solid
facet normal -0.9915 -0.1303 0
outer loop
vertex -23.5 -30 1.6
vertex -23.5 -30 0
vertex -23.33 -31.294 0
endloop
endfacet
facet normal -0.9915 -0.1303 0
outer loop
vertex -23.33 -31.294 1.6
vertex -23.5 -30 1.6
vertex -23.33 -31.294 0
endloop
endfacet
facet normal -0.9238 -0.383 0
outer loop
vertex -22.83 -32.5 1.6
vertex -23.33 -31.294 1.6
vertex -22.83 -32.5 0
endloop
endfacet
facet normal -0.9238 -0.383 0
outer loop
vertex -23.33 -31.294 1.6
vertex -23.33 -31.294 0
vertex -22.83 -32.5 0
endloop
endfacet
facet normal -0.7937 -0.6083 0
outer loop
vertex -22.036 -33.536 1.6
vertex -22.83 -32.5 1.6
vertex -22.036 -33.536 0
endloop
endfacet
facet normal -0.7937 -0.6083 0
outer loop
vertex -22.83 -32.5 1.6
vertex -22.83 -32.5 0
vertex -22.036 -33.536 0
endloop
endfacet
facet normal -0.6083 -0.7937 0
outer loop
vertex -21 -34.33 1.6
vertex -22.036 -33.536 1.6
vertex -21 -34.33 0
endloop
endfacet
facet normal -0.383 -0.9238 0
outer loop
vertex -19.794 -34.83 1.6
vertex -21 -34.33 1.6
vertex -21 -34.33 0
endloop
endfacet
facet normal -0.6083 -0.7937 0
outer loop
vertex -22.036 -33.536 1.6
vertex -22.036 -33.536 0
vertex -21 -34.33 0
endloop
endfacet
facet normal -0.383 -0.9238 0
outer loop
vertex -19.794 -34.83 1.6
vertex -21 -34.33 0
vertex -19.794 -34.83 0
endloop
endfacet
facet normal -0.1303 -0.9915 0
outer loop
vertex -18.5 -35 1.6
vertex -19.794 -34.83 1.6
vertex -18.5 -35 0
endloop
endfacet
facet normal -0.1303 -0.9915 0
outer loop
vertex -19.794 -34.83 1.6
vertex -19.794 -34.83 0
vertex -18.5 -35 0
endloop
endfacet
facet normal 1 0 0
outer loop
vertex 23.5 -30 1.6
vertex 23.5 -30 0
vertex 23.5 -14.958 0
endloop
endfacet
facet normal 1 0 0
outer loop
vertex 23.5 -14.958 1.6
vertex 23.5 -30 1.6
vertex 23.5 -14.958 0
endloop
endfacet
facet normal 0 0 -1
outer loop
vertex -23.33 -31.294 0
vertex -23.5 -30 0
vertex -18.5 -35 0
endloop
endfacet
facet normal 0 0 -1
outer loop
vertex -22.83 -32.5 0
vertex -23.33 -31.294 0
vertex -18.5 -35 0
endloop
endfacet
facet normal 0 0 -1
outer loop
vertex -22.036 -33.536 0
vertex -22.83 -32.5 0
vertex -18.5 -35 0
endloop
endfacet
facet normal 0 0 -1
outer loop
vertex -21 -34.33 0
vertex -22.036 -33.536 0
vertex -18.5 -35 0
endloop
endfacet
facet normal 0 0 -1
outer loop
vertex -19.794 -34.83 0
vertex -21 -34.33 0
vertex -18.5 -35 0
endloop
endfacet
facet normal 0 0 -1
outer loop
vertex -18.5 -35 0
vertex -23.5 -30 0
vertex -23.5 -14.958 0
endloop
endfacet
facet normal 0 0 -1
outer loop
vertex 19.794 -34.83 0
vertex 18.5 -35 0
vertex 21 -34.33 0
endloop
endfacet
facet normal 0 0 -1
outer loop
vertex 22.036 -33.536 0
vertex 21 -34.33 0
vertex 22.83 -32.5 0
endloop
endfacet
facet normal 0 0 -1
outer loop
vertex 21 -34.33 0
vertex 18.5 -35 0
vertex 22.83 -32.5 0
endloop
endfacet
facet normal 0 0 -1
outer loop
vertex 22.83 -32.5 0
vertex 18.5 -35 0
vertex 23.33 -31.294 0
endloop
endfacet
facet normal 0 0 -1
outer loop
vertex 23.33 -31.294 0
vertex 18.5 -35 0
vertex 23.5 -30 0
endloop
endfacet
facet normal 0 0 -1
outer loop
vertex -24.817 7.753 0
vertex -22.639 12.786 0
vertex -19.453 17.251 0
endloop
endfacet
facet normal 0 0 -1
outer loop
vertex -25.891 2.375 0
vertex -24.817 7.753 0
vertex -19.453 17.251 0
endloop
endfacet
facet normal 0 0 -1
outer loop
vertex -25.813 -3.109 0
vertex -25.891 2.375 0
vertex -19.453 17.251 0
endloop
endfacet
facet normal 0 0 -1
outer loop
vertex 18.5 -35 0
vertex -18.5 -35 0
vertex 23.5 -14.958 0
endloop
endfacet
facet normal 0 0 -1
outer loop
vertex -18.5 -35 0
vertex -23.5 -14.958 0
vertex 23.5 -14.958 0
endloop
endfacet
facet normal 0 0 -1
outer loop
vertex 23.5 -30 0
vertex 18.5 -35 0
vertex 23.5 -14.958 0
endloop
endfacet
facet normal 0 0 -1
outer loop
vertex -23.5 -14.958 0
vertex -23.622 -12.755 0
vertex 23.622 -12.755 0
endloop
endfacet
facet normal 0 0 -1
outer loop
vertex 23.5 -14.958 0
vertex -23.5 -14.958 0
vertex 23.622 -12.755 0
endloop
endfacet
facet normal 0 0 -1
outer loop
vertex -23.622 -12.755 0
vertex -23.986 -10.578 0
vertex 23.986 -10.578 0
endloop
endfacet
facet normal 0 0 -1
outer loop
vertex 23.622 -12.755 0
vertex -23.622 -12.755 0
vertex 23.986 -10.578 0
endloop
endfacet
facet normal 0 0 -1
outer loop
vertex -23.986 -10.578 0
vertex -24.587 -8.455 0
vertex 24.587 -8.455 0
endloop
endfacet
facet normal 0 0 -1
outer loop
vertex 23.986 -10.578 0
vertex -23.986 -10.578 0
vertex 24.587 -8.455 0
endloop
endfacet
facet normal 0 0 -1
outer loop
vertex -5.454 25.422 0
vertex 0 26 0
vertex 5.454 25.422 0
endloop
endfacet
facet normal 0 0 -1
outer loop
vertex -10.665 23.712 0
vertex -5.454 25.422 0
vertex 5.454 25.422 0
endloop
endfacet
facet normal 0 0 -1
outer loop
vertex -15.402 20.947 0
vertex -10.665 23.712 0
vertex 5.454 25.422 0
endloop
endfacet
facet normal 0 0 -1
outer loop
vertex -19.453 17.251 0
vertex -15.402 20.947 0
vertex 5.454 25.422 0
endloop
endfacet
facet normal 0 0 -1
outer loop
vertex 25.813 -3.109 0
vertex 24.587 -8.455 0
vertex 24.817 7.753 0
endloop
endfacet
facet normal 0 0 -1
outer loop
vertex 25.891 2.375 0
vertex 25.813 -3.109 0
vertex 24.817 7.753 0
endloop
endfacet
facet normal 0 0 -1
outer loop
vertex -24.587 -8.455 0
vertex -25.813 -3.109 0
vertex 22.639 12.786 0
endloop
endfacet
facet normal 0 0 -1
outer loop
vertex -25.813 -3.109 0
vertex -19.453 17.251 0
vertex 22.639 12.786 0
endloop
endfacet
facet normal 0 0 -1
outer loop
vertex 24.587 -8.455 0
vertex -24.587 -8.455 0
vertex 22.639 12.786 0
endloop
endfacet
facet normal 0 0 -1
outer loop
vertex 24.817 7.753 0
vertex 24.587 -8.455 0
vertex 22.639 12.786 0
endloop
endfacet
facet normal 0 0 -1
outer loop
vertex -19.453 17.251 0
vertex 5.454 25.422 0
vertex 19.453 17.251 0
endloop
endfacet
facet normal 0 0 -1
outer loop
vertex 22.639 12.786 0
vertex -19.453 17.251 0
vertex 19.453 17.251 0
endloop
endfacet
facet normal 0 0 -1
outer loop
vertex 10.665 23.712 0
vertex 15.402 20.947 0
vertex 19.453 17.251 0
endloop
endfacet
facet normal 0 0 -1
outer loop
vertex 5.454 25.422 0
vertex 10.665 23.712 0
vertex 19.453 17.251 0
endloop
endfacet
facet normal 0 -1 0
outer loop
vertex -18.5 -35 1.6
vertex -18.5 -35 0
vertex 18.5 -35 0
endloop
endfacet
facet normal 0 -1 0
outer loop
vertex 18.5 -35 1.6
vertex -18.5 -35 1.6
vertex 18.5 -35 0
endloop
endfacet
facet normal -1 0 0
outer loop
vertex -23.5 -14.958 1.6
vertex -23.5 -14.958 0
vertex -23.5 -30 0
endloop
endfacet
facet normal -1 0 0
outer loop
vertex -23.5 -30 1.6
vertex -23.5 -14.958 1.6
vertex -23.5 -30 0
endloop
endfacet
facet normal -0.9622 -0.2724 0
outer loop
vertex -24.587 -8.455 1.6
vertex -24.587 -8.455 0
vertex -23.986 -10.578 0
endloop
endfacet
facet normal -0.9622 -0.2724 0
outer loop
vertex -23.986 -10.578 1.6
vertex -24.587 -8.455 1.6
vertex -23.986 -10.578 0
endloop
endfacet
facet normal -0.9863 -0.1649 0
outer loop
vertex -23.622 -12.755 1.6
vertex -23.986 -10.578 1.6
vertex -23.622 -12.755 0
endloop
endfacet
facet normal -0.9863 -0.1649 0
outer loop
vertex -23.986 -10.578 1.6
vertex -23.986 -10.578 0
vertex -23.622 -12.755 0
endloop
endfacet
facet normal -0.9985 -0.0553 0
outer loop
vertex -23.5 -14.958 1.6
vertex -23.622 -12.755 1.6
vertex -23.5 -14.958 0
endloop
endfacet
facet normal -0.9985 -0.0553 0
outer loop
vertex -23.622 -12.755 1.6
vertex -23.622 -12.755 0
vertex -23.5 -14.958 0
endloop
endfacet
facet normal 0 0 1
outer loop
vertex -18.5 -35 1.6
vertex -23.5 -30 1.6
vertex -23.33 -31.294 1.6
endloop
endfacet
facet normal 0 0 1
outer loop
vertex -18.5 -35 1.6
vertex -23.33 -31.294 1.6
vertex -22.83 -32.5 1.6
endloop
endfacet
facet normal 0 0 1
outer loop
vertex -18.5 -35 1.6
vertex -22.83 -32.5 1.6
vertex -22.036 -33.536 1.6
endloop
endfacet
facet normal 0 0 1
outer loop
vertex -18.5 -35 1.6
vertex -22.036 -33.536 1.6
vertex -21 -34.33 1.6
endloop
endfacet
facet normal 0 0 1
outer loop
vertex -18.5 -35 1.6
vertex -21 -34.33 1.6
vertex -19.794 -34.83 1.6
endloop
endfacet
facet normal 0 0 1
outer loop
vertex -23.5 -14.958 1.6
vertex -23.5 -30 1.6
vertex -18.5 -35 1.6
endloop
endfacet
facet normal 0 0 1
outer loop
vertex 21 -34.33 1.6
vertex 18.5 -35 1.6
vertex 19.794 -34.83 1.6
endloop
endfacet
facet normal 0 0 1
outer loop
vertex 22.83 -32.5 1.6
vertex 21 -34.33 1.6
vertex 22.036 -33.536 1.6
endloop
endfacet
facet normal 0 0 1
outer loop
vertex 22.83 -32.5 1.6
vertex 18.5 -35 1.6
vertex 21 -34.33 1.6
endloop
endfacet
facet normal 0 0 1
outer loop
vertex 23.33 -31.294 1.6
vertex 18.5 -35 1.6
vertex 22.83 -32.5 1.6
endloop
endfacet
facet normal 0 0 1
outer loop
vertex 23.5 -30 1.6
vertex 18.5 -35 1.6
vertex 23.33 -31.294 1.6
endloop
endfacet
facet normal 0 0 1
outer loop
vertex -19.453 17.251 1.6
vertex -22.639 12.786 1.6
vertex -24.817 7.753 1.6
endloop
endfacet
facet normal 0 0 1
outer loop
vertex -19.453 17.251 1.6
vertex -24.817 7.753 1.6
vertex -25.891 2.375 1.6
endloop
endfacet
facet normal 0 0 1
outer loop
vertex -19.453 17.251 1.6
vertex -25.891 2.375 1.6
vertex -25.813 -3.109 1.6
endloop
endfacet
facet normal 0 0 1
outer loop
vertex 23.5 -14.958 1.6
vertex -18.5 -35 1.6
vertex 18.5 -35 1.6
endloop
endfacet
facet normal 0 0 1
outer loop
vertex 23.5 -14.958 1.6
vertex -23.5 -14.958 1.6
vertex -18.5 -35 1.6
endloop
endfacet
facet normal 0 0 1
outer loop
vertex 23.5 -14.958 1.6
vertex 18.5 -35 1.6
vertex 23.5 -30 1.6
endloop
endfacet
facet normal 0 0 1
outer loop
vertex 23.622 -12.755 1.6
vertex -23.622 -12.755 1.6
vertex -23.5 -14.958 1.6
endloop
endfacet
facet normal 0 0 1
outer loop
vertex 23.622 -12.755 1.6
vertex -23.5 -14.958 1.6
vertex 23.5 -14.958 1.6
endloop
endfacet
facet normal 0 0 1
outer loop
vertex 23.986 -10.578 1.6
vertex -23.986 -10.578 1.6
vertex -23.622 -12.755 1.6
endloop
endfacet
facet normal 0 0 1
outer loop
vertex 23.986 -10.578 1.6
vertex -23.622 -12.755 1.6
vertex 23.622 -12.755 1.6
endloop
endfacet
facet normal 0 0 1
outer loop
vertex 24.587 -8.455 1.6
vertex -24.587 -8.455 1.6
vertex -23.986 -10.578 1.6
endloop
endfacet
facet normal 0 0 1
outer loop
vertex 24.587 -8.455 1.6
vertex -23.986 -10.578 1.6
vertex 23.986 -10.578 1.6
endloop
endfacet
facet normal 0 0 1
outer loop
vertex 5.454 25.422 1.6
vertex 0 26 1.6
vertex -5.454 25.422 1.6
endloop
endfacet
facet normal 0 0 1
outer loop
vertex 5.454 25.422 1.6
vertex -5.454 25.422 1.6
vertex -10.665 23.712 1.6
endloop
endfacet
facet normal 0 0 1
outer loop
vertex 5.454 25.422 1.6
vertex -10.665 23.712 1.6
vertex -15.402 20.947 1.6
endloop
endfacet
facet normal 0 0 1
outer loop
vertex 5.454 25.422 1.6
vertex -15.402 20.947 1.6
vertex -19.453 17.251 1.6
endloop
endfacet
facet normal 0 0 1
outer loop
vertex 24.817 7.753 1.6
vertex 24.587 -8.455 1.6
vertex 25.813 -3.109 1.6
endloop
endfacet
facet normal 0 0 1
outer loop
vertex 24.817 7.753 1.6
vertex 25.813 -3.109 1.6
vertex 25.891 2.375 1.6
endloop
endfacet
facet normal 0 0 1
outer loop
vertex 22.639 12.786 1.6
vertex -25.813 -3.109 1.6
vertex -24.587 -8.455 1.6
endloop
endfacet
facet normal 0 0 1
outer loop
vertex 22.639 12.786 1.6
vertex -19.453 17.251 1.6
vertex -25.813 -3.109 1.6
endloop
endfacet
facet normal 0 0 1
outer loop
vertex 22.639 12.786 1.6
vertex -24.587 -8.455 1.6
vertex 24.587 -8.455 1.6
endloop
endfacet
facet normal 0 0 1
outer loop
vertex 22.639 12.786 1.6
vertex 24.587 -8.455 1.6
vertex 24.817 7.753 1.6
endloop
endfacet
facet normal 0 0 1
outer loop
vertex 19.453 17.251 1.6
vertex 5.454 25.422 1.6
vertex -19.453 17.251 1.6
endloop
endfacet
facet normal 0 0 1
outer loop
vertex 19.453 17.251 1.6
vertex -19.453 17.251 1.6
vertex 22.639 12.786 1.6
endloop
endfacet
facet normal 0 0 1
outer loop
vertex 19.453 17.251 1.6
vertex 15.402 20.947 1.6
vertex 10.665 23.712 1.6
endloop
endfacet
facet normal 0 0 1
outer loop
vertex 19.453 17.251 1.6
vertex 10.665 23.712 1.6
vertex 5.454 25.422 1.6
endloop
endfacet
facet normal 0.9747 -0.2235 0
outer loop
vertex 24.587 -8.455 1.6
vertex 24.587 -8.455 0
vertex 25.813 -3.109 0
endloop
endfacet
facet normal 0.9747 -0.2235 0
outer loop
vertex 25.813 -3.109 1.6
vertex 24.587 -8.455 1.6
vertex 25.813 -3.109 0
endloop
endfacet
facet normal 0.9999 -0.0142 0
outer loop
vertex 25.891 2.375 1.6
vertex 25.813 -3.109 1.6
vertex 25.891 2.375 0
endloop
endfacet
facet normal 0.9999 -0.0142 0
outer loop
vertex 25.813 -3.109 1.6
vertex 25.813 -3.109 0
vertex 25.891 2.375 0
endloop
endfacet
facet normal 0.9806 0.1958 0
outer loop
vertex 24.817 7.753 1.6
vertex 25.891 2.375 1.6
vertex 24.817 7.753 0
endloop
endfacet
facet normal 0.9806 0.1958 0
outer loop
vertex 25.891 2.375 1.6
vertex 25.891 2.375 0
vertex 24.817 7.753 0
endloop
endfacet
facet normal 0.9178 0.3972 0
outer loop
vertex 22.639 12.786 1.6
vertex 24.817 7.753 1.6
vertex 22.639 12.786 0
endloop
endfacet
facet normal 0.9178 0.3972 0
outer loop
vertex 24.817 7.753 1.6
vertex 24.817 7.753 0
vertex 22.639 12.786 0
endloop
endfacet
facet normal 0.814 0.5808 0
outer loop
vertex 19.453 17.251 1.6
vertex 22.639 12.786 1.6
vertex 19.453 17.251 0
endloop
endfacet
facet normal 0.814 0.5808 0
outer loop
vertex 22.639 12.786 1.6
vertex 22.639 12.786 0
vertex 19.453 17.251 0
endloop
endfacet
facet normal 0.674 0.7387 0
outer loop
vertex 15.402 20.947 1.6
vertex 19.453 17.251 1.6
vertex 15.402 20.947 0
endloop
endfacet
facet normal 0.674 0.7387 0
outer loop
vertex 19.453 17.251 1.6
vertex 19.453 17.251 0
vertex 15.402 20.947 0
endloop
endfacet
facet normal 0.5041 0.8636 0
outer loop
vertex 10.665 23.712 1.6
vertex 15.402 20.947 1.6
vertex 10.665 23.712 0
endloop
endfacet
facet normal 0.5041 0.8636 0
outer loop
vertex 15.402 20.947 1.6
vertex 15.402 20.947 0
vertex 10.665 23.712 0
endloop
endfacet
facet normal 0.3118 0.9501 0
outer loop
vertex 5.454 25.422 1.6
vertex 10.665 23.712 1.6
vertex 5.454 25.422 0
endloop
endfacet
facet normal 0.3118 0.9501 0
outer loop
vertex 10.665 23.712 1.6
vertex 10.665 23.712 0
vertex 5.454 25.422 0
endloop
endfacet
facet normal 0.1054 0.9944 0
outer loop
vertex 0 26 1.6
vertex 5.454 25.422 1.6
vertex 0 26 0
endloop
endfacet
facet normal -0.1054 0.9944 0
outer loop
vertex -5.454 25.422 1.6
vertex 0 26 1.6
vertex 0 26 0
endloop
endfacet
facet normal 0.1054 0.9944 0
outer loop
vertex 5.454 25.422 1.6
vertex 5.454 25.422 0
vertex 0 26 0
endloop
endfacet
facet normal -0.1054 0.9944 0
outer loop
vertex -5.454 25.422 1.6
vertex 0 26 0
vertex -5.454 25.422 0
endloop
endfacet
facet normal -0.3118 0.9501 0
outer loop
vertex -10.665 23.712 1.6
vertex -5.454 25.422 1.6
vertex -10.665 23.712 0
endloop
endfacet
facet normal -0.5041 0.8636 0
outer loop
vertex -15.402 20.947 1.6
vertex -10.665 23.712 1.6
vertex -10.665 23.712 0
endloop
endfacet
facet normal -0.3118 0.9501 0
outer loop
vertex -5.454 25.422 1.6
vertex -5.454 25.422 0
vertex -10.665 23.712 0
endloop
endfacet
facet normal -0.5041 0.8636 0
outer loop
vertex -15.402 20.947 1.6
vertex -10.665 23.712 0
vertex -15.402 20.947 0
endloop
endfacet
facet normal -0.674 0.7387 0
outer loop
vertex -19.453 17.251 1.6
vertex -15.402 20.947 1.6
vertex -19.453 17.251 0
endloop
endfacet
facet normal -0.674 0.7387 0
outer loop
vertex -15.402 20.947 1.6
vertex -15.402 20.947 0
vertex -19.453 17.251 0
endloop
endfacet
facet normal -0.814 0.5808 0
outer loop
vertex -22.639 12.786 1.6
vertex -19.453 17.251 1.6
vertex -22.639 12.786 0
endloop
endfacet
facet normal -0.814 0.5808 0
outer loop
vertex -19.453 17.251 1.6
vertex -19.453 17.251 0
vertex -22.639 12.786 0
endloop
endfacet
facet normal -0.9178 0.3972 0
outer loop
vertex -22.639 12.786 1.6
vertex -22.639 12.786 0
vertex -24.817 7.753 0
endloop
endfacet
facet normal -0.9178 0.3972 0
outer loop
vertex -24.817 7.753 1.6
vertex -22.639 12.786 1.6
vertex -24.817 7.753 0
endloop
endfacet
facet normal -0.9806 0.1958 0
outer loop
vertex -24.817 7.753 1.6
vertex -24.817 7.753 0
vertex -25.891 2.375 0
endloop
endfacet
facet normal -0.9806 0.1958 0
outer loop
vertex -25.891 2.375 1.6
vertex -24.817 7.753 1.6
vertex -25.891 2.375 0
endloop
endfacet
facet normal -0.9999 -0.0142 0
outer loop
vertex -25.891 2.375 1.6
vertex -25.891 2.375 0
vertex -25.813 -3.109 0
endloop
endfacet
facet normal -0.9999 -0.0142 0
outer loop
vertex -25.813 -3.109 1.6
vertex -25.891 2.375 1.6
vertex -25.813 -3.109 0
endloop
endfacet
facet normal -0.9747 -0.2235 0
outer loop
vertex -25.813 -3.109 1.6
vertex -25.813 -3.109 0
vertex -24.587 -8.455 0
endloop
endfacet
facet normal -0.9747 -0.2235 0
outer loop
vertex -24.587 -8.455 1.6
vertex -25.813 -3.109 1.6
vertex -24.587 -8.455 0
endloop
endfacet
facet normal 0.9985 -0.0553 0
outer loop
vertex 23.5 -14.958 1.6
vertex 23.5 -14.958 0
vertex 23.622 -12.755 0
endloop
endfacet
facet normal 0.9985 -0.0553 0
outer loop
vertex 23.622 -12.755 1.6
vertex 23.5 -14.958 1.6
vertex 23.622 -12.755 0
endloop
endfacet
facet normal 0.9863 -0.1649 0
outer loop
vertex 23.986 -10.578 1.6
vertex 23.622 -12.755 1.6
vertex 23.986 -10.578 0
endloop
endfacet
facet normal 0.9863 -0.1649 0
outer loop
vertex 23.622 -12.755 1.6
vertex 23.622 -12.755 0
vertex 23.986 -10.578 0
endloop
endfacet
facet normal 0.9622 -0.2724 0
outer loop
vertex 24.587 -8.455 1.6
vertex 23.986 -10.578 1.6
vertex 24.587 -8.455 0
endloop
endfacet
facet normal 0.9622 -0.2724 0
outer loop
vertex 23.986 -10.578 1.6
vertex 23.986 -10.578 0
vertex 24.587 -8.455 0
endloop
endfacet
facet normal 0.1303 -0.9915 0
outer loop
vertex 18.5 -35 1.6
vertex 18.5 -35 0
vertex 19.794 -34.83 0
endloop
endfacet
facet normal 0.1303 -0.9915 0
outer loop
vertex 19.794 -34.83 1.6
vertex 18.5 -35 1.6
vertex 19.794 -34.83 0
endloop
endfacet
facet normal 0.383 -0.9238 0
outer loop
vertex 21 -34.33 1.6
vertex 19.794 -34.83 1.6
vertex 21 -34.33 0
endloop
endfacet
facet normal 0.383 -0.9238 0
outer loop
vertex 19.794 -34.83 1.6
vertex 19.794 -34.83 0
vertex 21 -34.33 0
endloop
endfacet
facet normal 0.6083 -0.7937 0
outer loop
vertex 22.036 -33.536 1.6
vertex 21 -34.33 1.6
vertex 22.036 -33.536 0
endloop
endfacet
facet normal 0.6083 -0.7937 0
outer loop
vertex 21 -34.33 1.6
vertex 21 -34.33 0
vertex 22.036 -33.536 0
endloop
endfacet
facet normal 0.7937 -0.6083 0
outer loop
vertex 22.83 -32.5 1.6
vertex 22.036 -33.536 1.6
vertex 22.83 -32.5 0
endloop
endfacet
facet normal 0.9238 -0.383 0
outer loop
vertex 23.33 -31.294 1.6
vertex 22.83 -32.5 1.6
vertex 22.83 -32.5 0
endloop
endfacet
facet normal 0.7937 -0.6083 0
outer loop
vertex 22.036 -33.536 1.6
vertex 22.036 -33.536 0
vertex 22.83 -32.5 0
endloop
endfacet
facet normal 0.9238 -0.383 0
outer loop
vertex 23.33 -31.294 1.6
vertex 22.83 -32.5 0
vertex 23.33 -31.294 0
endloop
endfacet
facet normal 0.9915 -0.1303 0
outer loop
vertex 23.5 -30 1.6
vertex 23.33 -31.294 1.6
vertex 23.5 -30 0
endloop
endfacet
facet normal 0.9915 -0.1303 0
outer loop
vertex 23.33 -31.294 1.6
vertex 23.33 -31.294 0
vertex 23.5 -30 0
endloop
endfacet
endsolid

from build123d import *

# Parameters (mm, degrees)
BOSS_EXTRUDE1_DEPTH = 1.6


with BuildPart() as part:
    # Sketch1 → Boss-Extrude1 (new body)
    with BuildSketch(Plane.XY):
        with BuildLine():
            Line((-23.5, -14.958275302), (-23.5, -30))
            ThreePointArc((-23.5, -30), (-22.035533906, -33.535533906), (-18.5, -35))
            Line((-18.5, -35), (18.5, -35))
            ThreePointArc((18.5, -35), (22.035533906, -33.535533906), (23.5, -30))
            Line((23.5, -30), (23.5, -14.958275302))
            ThreePointArc((23.5, -14.958275302), (23.773610701, -11.661372935), (24.586956522, -8.454677344))
            ThreePointArc((24.586956522, -8.454677344), (0, 26), (-24.586956522, -8.454677344))
            ThreePointArc((-24.586956522, -8.454677344), (-23.773610701, -11.661372935), (-23.5, -14.958275302))
        make_face()
    extrude(amount=BOSS_EXTRUDE1_DEPTH)


solid = part.part
